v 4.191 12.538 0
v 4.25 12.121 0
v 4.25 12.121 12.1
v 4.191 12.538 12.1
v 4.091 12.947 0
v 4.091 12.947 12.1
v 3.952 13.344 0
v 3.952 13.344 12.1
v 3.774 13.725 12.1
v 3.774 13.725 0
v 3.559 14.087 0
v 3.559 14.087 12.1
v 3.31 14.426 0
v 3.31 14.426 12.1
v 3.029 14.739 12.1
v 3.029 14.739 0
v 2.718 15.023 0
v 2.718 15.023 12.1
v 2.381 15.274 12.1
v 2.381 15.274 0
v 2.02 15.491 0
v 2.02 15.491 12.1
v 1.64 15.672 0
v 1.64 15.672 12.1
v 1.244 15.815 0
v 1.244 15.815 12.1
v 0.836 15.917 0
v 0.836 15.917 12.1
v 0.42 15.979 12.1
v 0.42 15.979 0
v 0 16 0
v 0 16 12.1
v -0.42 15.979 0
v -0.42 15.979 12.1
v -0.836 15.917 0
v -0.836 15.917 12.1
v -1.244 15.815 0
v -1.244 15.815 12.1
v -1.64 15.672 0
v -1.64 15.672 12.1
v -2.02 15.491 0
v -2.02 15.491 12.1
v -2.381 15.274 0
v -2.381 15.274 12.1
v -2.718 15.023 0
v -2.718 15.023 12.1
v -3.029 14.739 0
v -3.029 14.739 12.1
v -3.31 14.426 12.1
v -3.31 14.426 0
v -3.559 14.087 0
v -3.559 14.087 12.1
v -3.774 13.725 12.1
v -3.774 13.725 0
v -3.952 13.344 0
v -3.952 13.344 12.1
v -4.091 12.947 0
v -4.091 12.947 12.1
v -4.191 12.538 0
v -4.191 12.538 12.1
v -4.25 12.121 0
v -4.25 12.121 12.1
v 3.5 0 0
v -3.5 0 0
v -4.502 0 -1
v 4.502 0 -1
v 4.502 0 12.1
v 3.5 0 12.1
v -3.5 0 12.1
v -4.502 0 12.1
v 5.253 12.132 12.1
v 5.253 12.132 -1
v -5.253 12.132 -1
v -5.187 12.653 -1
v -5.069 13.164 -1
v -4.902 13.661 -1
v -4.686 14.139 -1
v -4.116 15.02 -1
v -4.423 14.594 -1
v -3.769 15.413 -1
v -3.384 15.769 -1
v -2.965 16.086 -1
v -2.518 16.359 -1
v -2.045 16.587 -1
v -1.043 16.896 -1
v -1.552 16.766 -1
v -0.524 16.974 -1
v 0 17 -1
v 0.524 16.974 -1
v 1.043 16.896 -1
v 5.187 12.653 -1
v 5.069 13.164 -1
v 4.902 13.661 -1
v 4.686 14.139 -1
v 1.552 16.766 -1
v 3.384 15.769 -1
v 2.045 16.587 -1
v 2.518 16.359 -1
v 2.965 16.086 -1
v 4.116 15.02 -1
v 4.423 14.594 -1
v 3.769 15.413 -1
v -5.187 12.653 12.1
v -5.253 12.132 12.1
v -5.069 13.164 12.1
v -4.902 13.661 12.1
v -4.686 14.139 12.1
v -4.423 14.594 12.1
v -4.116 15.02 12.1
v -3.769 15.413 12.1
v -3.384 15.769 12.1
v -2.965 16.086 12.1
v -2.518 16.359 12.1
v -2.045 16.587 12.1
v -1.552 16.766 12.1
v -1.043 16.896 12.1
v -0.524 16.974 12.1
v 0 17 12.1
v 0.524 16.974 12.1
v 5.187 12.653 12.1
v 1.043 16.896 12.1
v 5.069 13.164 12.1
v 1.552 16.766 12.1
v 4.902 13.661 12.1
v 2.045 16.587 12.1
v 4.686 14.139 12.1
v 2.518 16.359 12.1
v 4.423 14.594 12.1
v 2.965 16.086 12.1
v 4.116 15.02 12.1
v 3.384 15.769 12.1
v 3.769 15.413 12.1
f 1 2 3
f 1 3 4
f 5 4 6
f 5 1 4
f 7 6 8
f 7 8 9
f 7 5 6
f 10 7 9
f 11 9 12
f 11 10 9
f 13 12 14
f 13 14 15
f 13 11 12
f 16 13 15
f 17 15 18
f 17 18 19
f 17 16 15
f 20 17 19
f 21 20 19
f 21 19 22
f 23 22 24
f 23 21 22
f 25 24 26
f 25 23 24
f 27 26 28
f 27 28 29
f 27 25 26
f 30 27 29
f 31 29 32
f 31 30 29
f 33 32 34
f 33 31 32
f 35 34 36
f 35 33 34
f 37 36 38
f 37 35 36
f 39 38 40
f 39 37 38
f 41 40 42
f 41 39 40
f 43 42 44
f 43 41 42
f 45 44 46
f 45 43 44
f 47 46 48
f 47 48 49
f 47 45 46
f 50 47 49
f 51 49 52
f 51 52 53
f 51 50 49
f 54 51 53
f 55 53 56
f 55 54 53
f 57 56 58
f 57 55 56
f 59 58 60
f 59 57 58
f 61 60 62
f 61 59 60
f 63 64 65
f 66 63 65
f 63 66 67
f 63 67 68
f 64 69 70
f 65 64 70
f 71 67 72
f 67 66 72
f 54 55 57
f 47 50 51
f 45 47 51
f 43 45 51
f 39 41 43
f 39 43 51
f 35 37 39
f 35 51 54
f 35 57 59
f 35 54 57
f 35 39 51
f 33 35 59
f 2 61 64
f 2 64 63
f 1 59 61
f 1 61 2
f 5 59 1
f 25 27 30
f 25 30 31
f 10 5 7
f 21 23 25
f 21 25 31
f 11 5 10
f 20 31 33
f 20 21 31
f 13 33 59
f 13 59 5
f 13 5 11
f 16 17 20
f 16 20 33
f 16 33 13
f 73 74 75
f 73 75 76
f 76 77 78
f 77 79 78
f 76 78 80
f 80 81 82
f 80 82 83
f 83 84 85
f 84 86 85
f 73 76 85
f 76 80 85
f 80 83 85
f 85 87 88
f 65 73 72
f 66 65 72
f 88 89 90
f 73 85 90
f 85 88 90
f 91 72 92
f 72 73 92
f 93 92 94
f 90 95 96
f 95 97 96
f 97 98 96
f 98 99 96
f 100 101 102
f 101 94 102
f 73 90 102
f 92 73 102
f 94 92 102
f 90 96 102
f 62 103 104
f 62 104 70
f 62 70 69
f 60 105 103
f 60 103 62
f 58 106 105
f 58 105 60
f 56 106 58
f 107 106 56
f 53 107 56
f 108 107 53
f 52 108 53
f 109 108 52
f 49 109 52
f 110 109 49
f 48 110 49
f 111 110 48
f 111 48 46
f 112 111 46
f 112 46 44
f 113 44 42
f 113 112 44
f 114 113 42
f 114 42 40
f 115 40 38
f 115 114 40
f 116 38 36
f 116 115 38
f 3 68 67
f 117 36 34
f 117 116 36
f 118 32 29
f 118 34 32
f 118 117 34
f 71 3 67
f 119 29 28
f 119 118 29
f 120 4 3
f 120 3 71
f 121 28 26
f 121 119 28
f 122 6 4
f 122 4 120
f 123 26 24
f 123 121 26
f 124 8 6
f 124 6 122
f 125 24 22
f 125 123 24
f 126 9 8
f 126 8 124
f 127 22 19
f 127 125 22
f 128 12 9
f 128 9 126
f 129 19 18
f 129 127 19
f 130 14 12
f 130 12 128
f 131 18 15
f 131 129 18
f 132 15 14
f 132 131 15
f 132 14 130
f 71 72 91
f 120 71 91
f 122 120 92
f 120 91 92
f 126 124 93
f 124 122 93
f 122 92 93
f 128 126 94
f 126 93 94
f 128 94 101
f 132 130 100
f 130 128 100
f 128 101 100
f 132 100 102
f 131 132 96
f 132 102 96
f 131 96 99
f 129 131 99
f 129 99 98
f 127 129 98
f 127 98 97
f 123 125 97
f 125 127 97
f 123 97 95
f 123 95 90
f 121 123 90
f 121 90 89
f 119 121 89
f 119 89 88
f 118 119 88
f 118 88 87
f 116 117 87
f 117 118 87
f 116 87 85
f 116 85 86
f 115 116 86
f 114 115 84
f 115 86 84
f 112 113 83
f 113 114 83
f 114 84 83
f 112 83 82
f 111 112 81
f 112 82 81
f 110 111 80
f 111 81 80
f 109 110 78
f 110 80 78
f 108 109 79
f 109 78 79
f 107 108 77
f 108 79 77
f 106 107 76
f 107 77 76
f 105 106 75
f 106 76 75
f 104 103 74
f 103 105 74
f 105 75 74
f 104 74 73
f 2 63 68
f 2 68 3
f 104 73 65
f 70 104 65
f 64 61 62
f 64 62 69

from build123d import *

# Parameters (mm, degrees)
F1_DEPTH = 12.1
F2_T     = 1
F3_W     = 13.9636243694
F3_H     = 14.0063923318
F4_DEPTH = 25


with BuildPart() as f1:
    # F0 (on Top) → F1 (new body)
    with BuildSketch(Plane.XY):
        with BuildLine():
            Line((-4.25, 12.1212695545), (-3.5, 0))
            Line((-3.5, 0), (3.5, 0))
            Line((3.5, 0), (4.25, 12.1212695545))
            ThreePointArc((4.25, 12.1212695545), (0, 16), (-4.25, 12.1212695545))
        make_face()
    extrude(amount=F1_DEPTH)

    # F2
    f2_openings = [f1.faces().sort_by_distance(p)[0] for p in [
        (0, 7.847048, 12.1),
    ]]
    offset(amount=F2_T, openings=f2_openings, kind=Kind.INTERSECTION)

    # F3 (on face) → F4 (cut)
    with BuildSketch(Plane(origin=(0, 0, 0), x_dir=(-1, 0, 0), z_dir=(0, 1, 0))):
        with Locations((-0.2180829179, 5.7105472079)):
            Rectangle(F3_W, F3_H)
    extrude(amount=-F4_DEPTH, mode=Mode.SUBTRACT)


solid = f1.part
